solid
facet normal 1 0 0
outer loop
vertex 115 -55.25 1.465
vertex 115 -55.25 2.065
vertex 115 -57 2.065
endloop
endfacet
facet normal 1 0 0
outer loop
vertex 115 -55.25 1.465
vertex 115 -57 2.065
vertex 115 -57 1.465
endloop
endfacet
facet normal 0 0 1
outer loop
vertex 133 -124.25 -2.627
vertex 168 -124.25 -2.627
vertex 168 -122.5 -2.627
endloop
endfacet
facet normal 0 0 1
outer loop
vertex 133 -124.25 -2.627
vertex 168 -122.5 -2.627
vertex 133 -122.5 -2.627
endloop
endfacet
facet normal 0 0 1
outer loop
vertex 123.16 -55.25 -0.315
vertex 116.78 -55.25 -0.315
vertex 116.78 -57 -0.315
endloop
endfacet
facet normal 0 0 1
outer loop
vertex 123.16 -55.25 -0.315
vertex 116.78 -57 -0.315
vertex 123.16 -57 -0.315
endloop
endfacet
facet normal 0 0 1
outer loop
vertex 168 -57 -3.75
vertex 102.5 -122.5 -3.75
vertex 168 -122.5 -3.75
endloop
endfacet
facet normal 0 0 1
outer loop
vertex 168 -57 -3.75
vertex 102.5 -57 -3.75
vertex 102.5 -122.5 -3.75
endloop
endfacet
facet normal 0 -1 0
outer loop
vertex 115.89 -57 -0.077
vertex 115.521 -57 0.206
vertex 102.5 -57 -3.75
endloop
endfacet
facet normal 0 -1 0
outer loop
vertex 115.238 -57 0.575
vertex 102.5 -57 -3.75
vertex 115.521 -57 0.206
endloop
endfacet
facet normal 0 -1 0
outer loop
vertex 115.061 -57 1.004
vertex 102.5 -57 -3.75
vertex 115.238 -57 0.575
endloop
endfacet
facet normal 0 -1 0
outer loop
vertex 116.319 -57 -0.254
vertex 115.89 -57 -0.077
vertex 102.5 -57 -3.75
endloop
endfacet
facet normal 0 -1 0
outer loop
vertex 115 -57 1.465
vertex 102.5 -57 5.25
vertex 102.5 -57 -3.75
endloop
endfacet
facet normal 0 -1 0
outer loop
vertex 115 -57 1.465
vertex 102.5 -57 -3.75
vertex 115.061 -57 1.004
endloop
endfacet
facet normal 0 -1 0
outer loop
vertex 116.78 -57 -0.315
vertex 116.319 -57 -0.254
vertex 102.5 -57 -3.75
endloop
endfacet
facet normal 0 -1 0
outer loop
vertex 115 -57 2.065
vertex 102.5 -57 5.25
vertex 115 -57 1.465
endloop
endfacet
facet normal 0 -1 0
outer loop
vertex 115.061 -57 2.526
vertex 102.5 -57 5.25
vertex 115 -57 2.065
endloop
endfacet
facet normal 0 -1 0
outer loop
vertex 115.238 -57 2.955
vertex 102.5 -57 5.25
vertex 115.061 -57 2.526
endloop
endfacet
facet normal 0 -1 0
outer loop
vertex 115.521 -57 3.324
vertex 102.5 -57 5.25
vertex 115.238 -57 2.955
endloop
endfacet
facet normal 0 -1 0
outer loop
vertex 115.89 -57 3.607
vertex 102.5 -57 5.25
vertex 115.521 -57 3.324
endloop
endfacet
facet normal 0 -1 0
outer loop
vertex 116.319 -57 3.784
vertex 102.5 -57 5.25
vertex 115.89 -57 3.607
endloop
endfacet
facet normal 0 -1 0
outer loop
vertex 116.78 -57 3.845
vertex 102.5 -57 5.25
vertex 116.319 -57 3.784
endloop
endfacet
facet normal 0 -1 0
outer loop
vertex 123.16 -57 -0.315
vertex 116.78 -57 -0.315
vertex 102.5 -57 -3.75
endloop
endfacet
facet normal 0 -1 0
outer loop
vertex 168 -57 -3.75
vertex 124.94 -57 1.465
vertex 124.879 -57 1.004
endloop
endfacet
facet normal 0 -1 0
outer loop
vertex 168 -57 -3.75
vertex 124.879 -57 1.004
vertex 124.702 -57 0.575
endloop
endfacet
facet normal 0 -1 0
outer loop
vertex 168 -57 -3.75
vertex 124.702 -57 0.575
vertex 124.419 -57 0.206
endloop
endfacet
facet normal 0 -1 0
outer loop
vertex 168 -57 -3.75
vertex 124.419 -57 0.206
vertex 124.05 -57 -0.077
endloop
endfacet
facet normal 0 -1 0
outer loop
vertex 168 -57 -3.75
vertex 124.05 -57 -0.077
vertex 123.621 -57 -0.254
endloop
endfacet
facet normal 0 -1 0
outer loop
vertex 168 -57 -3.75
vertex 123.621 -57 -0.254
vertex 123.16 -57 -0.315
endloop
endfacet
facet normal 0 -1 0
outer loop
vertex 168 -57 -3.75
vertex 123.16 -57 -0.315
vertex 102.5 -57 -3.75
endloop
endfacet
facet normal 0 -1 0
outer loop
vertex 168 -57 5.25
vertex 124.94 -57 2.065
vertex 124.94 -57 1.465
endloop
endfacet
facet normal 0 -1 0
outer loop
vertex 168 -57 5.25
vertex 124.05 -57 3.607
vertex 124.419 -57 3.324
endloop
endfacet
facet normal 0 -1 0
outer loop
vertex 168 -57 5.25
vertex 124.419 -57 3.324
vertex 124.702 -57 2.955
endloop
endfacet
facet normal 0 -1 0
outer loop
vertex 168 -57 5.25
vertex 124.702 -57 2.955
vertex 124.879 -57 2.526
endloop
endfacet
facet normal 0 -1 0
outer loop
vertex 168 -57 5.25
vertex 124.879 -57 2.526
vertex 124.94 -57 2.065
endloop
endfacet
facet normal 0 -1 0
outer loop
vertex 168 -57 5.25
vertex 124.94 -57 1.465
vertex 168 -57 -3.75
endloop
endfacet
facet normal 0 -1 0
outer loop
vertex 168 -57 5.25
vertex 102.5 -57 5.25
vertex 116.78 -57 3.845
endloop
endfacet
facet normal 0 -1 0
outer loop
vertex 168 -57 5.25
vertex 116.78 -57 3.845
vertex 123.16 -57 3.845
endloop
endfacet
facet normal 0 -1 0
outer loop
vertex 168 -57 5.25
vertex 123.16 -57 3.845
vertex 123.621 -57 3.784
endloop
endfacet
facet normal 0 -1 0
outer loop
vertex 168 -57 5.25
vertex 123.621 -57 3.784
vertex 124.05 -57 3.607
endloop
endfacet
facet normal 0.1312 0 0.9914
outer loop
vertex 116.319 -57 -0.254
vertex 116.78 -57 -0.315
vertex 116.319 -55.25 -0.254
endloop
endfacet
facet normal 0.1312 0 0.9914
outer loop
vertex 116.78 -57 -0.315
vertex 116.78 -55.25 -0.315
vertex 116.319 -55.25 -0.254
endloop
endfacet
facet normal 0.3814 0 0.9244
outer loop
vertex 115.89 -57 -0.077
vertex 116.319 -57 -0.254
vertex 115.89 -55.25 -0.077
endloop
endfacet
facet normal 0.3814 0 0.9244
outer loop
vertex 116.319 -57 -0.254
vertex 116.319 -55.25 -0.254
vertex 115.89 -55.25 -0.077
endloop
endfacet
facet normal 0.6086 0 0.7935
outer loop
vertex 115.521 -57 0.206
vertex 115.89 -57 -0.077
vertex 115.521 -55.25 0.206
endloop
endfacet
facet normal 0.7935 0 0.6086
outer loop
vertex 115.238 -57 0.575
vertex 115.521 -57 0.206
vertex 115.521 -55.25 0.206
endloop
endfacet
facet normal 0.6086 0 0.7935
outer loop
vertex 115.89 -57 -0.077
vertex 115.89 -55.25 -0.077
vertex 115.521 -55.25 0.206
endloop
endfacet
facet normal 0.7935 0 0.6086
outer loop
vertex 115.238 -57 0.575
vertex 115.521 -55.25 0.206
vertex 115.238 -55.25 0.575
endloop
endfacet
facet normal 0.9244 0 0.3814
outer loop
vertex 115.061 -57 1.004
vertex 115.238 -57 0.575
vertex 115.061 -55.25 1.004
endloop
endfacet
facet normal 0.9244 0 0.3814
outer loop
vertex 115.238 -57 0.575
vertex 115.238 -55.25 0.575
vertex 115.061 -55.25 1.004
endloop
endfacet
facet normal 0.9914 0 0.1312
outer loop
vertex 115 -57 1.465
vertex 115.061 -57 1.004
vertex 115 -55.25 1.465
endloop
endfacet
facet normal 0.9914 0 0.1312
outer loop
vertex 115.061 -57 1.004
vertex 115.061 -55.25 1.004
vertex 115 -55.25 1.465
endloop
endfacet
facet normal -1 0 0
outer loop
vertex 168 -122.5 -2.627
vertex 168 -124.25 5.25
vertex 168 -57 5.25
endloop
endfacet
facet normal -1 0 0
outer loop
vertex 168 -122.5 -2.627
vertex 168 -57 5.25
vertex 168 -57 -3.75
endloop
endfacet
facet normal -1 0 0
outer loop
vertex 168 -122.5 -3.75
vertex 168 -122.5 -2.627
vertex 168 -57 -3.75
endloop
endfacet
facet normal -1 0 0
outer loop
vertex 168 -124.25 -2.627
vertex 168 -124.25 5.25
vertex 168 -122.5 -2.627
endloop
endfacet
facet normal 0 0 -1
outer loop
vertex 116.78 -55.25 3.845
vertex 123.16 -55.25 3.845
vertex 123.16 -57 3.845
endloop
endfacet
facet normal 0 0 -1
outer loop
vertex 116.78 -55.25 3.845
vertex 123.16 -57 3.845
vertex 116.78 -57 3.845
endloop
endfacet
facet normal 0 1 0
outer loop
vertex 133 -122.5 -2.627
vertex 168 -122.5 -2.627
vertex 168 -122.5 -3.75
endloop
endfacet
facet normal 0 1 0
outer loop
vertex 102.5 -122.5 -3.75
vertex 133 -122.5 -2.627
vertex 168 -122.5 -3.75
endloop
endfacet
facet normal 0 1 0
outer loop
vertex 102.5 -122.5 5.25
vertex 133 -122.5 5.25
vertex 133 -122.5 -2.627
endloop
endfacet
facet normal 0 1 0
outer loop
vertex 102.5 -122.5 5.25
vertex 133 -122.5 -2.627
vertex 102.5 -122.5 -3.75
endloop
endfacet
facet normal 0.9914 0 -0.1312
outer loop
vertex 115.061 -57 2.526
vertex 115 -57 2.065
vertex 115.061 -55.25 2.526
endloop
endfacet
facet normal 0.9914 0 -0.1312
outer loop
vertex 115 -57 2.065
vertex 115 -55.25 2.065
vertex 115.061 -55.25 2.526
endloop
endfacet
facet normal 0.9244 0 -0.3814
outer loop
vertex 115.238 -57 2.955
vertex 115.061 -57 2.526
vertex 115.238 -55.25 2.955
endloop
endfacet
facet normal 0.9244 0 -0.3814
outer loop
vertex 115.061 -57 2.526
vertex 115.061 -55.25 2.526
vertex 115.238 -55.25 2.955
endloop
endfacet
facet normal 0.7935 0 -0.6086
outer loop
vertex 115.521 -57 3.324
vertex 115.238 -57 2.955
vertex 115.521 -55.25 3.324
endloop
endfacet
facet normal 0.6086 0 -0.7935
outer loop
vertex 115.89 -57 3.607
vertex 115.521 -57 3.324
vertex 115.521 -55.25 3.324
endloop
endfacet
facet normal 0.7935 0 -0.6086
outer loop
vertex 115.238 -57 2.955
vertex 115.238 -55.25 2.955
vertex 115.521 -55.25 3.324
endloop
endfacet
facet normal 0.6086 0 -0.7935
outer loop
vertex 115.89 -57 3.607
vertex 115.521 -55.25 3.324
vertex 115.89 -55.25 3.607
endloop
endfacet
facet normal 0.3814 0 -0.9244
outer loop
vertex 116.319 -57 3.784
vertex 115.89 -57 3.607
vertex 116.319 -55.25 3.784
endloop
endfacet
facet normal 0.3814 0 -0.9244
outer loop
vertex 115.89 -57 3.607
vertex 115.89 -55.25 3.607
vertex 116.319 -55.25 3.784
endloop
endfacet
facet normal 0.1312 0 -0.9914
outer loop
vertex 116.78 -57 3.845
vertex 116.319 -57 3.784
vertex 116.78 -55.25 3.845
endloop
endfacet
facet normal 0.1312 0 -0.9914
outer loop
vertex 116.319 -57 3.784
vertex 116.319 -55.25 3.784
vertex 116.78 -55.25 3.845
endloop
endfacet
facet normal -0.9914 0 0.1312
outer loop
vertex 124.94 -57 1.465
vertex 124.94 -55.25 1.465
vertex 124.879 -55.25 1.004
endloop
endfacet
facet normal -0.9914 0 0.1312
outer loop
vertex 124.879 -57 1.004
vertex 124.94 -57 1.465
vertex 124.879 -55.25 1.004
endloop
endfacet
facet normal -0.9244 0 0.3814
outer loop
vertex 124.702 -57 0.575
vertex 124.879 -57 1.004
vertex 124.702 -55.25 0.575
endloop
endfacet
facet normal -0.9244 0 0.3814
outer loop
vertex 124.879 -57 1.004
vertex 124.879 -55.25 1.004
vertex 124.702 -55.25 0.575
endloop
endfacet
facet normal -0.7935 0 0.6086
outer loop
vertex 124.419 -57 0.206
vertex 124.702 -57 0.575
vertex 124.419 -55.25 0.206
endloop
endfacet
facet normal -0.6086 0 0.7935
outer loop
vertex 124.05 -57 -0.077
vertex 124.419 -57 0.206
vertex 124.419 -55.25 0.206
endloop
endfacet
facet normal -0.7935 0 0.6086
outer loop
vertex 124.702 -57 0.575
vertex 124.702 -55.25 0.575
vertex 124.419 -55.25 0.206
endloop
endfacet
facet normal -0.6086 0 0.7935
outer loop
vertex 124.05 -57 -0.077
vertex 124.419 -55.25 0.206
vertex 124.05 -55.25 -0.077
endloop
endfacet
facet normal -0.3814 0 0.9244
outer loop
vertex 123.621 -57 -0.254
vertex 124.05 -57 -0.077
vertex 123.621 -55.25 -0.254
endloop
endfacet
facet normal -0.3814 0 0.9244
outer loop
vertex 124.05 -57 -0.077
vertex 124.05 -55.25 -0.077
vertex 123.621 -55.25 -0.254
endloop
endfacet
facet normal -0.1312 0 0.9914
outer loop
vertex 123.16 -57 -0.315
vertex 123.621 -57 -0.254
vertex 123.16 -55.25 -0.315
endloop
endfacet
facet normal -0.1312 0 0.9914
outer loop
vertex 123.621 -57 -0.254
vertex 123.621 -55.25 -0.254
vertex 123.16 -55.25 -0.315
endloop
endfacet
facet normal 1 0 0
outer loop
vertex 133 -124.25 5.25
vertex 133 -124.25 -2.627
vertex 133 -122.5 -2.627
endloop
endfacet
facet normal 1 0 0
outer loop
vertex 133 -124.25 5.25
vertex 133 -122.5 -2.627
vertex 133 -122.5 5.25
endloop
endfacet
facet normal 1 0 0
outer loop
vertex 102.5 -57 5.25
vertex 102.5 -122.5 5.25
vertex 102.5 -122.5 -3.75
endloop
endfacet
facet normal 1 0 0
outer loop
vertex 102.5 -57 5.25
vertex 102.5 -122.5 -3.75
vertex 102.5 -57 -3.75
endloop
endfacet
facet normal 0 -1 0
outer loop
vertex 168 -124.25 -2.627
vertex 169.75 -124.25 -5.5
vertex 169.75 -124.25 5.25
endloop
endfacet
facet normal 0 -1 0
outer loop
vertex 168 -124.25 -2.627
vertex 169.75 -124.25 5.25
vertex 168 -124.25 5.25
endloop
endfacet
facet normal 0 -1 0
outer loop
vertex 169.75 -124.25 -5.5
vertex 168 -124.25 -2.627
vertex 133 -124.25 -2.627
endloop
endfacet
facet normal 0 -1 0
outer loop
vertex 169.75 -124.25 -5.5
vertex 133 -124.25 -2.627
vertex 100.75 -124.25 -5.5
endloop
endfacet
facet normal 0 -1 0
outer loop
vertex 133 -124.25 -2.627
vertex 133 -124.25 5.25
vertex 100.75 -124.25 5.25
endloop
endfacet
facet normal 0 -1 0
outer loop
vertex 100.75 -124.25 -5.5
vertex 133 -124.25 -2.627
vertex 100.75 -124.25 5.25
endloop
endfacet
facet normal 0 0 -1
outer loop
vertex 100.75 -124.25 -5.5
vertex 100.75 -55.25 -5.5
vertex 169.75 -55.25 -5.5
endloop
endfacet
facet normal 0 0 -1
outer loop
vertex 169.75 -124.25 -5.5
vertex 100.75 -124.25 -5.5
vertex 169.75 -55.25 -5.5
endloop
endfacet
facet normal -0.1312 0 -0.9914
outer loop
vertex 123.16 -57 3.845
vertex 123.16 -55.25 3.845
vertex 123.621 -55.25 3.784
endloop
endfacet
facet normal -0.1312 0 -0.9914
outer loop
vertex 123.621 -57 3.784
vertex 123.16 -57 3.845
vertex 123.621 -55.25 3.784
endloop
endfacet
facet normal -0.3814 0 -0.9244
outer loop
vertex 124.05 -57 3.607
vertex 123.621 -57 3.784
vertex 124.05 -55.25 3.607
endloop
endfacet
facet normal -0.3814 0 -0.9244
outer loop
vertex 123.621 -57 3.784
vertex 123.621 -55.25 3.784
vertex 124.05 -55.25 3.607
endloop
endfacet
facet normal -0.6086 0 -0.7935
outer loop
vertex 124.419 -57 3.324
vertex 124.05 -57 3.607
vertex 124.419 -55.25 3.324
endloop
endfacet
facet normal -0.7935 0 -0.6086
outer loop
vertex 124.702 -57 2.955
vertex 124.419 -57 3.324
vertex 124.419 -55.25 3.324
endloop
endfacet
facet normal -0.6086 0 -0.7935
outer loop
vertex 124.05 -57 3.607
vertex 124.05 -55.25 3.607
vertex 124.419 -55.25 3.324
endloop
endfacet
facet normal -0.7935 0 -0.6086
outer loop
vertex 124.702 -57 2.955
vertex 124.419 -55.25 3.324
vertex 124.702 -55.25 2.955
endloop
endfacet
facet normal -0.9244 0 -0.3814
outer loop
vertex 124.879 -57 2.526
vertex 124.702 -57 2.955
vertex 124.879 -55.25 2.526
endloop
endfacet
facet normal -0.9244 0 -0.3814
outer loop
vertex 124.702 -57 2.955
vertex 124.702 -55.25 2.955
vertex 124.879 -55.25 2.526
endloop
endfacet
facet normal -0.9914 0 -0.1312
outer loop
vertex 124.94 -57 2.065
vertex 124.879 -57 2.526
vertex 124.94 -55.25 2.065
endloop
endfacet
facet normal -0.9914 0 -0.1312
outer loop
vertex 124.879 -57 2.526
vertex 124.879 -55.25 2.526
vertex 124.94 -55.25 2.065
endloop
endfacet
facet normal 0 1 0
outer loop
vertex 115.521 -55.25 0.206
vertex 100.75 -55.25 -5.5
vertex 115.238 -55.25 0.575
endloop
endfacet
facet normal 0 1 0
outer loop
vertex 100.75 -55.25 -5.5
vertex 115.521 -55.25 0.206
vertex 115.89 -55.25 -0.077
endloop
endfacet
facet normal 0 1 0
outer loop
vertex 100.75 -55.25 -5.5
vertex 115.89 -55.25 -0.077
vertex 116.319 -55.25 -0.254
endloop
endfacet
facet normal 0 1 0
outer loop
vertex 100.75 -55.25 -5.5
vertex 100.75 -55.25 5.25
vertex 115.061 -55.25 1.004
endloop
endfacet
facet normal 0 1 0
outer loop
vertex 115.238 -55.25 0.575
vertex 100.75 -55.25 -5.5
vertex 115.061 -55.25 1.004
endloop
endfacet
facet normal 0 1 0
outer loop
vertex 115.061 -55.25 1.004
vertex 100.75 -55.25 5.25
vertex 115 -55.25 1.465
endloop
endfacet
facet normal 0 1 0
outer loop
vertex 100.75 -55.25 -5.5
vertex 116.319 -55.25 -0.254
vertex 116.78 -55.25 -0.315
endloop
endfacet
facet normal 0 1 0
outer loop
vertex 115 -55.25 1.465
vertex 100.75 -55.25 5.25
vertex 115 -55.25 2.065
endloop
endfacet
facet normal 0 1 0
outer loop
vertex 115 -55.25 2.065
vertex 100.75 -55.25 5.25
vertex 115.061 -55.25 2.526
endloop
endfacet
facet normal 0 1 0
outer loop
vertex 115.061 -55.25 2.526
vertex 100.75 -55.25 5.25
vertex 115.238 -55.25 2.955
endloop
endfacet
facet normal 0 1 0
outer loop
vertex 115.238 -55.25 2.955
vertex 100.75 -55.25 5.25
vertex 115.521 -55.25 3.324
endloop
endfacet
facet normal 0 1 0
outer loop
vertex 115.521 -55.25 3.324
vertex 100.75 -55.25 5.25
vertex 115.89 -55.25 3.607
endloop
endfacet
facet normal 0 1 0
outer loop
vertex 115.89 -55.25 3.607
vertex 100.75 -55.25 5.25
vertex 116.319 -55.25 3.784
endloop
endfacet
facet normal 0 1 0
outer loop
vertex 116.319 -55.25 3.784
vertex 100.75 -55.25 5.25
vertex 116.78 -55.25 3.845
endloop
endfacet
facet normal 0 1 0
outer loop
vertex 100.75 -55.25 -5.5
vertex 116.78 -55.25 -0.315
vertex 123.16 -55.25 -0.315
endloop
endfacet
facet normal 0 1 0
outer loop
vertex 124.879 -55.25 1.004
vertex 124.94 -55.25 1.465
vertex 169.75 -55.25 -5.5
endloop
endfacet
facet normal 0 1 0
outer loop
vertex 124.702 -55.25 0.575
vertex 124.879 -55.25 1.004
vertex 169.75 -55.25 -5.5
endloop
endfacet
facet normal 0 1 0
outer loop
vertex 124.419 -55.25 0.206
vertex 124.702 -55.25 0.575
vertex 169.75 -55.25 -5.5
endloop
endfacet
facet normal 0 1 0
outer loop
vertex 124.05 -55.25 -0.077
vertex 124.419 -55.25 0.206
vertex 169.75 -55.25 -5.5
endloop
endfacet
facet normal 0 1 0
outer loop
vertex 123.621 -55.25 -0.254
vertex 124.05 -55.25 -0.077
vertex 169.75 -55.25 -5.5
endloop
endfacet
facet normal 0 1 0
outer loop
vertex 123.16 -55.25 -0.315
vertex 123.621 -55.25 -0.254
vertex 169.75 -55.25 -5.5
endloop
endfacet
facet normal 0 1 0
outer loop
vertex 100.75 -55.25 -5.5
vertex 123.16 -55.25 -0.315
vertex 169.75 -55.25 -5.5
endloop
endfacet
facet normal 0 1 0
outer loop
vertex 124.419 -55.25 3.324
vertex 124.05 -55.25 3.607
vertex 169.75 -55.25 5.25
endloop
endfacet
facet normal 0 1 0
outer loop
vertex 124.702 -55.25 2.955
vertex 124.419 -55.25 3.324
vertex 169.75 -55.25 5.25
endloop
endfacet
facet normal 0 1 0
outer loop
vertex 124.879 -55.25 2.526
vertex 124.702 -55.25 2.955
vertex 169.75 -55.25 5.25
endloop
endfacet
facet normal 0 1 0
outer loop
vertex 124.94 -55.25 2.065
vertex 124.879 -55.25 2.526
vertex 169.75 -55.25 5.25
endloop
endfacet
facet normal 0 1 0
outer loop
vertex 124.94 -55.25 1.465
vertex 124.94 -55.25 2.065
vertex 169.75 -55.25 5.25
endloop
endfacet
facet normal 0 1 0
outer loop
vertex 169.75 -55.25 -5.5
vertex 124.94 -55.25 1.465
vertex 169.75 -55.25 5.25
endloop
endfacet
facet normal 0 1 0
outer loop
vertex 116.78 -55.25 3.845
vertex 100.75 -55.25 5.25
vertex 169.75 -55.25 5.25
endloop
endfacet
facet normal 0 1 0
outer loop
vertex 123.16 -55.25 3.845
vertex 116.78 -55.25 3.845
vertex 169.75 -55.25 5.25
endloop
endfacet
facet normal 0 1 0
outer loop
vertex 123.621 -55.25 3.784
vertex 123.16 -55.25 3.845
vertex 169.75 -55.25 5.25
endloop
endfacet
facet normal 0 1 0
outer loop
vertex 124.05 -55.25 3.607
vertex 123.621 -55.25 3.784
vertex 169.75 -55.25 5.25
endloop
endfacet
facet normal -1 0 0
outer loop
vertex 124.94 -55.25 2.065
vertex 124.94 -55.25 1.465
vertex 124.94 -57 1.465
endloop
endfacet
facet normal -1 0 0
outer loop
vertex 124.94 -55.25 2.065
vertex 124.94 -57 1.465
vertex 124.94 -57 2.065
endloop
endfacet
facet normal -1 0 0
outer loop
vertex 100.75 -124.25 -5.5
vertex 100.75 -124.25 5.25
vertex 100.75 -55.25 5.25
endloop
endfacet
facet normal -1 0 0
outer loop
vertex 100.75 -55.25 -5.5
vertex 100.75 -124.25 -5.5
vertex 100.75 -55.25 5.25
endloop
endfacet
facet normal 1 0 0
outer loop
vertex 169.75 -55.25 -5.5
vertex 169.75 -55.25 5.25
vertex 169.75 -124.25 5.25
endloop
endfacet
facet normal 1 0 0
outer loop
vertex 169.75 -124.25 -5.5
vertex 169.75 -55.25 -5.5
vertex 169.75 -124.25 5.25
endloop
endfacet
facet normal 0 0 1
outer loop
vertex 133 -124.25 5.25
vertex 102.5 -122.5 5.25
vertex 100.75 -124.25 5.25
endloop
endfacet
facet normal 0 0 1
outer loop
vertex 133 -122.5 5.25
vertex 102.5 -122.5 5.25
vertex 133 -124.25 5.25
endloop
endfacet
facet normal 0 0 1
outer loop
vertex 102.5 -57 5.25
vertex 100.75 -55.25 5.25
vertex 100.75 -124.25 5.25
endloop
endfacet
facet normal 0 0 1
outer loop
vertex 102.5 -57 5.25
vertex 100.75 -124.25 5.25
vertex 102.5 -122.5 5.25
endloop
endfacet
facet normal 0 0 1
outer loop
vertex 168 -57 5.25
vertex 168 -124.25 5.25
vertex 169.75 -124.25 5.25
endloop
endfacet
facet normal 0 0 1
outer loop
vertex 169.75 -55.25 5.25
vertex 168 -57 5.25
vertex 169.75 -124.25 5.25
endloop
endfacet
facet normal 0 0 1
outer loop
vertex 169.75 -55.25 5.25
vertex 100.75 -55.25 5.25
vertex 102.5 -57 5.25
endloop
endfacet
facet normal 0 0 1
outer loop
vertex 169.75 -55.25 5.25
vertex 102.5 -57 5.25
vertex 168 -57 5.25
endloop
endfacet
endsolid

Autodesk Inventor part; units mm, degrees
ref_plane "YZ Plane" through (0, 0, 0) normal (1, 0, 0) x (0, 1, 0)
ref_plane "XZ Plane" through (0, 0, 0) normal (0, 1, 0) x (-1, 0, 0)
ref_plane "XY Plane" through (0, 0, 0) normal (0, 0, 1) x (1, 0, 0)
sketch "Sketch1" plane through (0, 0, 0) normal (0, 0, 1) x (1, 0, 0)
  line L0 (100.75, -55.25) -> (169.75, -55.25)
  line L1 (169.75, -55.25) -> (169.75, -124.25)
  line L2 (169.75, -124.25) -> (100.75, -124.25)
  line L3 (100.75, -124.25) -> (100.75, -55.25)
  line L4 (167.75, -122.25) -> (102.75, -122.25) projected
  line L5 (167.75, -57.25) -> (167.75, -122.25) projected
  line L6 (102.75, -57.25) -> (167.75, -57.25) projected
  line L7 (102.75, -122.25) -> (102.75, -57.25) projected
  point P0 (0, 0)
  dimension "d0" = 69
  dimension "d1" = 69
  dimension "d2" = 2
  dimension "d3" = 2
extrude "Base Shell Extrusion" add sketch "Sketch1" along normal blind 5.25 and the other way blind 5.5 contours L0 L1 L2 L3 | L4 L7 L6 L5
shell "Shell1" thickness 1.75 removed faces 1 at (123.75, -101.25, 5.25)
sketch "USB C Port hole sketch" plane through (100.75, -55.25, 5.25) normal (0, 1, 0) x (1, 0, 0)
  line L0 (19.22, 1.905) -> (22.41, 1.905) projected
  arc A0 (22.41, 1.905) -> (23.69, 3.185) centre (22.41, 3.185) ccw projected
  line L1 (23.69, 3.185) -> (23.69, 3.785) projected
  arc A1 (23.69, 3.785) -> (22.41, 5.065) centre (22.41, 3.785) ccw projected
  line L2 (22.41, 5.065) -> (19.22, 5.065) projected
  line L3 (16.03, 5.065) -> (19.22, 5.065) projected
  arc A2 (16.03, 5.065) -> (14.75, 3.785) centre (16.03, 3.785) ccw projected
  line L4 (14.75, 3.185) -> (14.75, 3.785) projected
  arc A3 (14.75, 3.185) -> (16.03, 1.905) centre (16.03, 3.185) ccw projected
  line L5 (19.22, 1.905) -> (16.03, 1.905) projected
  arc A4 (22.41, 1.905) -> (23.69, 3.185) centre (22.41, 3.185) ccw
  arc A5 (14.75, 3.185) -> (16.03, 1.905) centre (16.03, 3.185) ccw
  arc A6 (16.03, 5.065) -> (14.75, 3.785) centre (16.03, 3.785) ccw
  arc A7 (23.69, 3.785) -> (22.41, 5.065) centre (22.41, 3.785) ccw
  line L6 (14.75, 3.785) -> (14.75, 3.185)
  line L7 (16.03, 5.065) -> (22.41, 5.065)
  line L8 (23.69, 3.785) -> (23.69, 3.185)
  line L9 (16.03, 1.905) -> (22.41, 1.905)
  line L10 (22.41, 1.405) -> (19.22, 1.405)
  line L11 (19.22, 1.405) -> (16.03, 1.405)
  arc A8 (14.25, 3.185) -> (16.03, 1.405) centre (16.03, 3.185) ccw
  line L12 (14.25, 3.185) -> (14.25, 3.785)
  arc A9 (16.03, 5.565) -> (14.25, 3.785) centre (16.03, 3.785) ccw
  line L13 (16.03, 5.565) -> (19.22, 5.565)
  line L14 (19.22, 5.565) -> (22.41, 5.565)
  arc A10 (24.19, 3.785) -> (22.41, 5.565) centre (22.41, 3.785) ccw
  line L15 (24.19, 3.785) -> (24.19, 3.185)
  arc A11 (22.41, 1.405) -> (24.19, 3.185) centre (22.41, 3.185) ccw
  point P0 (-100.75, 5.25)
  dimension "d24" = 0.5
sketch "Rough encoder hole" plane through (100.75, -124.25, 5.25) normal (0, -1, 0) x (1, 0, 0)
  line L0 (67.25, -7.8767) -> (32.25, -7.8767)
  line L1 (32.25, -7.8767) -> (32.25, 0.1233)
  line L2 (32.25, 0.1233) -> (67.25, 0.1233)
  line L3 (67.25, 0.1233) -> (67.25, -7.8767)
  line L4 (67.25, -9) -> (67.25, 0) projected
  point P0 (-100.75, -5.25)
  dimension "d13" = 35
  dimension "d14" = 8
  dimension "d17" = 0
extrude "Rough Encoder Hole Extrusion" cut sketch "Rough encoder hole" against normal up to surface (1.75 mm away)
extrude "USB C Hole Extrusion" cut sketch "USB C Port hole sketch" against normal up to surface (1.75 mm away) contours L5 A3 L4 A2 L3 L2 A1 L1 A0 L0 | L10 L11 A8 L12 A9 L13 L14 A10 L15 A11
properties part number "Base REV 1.0"
